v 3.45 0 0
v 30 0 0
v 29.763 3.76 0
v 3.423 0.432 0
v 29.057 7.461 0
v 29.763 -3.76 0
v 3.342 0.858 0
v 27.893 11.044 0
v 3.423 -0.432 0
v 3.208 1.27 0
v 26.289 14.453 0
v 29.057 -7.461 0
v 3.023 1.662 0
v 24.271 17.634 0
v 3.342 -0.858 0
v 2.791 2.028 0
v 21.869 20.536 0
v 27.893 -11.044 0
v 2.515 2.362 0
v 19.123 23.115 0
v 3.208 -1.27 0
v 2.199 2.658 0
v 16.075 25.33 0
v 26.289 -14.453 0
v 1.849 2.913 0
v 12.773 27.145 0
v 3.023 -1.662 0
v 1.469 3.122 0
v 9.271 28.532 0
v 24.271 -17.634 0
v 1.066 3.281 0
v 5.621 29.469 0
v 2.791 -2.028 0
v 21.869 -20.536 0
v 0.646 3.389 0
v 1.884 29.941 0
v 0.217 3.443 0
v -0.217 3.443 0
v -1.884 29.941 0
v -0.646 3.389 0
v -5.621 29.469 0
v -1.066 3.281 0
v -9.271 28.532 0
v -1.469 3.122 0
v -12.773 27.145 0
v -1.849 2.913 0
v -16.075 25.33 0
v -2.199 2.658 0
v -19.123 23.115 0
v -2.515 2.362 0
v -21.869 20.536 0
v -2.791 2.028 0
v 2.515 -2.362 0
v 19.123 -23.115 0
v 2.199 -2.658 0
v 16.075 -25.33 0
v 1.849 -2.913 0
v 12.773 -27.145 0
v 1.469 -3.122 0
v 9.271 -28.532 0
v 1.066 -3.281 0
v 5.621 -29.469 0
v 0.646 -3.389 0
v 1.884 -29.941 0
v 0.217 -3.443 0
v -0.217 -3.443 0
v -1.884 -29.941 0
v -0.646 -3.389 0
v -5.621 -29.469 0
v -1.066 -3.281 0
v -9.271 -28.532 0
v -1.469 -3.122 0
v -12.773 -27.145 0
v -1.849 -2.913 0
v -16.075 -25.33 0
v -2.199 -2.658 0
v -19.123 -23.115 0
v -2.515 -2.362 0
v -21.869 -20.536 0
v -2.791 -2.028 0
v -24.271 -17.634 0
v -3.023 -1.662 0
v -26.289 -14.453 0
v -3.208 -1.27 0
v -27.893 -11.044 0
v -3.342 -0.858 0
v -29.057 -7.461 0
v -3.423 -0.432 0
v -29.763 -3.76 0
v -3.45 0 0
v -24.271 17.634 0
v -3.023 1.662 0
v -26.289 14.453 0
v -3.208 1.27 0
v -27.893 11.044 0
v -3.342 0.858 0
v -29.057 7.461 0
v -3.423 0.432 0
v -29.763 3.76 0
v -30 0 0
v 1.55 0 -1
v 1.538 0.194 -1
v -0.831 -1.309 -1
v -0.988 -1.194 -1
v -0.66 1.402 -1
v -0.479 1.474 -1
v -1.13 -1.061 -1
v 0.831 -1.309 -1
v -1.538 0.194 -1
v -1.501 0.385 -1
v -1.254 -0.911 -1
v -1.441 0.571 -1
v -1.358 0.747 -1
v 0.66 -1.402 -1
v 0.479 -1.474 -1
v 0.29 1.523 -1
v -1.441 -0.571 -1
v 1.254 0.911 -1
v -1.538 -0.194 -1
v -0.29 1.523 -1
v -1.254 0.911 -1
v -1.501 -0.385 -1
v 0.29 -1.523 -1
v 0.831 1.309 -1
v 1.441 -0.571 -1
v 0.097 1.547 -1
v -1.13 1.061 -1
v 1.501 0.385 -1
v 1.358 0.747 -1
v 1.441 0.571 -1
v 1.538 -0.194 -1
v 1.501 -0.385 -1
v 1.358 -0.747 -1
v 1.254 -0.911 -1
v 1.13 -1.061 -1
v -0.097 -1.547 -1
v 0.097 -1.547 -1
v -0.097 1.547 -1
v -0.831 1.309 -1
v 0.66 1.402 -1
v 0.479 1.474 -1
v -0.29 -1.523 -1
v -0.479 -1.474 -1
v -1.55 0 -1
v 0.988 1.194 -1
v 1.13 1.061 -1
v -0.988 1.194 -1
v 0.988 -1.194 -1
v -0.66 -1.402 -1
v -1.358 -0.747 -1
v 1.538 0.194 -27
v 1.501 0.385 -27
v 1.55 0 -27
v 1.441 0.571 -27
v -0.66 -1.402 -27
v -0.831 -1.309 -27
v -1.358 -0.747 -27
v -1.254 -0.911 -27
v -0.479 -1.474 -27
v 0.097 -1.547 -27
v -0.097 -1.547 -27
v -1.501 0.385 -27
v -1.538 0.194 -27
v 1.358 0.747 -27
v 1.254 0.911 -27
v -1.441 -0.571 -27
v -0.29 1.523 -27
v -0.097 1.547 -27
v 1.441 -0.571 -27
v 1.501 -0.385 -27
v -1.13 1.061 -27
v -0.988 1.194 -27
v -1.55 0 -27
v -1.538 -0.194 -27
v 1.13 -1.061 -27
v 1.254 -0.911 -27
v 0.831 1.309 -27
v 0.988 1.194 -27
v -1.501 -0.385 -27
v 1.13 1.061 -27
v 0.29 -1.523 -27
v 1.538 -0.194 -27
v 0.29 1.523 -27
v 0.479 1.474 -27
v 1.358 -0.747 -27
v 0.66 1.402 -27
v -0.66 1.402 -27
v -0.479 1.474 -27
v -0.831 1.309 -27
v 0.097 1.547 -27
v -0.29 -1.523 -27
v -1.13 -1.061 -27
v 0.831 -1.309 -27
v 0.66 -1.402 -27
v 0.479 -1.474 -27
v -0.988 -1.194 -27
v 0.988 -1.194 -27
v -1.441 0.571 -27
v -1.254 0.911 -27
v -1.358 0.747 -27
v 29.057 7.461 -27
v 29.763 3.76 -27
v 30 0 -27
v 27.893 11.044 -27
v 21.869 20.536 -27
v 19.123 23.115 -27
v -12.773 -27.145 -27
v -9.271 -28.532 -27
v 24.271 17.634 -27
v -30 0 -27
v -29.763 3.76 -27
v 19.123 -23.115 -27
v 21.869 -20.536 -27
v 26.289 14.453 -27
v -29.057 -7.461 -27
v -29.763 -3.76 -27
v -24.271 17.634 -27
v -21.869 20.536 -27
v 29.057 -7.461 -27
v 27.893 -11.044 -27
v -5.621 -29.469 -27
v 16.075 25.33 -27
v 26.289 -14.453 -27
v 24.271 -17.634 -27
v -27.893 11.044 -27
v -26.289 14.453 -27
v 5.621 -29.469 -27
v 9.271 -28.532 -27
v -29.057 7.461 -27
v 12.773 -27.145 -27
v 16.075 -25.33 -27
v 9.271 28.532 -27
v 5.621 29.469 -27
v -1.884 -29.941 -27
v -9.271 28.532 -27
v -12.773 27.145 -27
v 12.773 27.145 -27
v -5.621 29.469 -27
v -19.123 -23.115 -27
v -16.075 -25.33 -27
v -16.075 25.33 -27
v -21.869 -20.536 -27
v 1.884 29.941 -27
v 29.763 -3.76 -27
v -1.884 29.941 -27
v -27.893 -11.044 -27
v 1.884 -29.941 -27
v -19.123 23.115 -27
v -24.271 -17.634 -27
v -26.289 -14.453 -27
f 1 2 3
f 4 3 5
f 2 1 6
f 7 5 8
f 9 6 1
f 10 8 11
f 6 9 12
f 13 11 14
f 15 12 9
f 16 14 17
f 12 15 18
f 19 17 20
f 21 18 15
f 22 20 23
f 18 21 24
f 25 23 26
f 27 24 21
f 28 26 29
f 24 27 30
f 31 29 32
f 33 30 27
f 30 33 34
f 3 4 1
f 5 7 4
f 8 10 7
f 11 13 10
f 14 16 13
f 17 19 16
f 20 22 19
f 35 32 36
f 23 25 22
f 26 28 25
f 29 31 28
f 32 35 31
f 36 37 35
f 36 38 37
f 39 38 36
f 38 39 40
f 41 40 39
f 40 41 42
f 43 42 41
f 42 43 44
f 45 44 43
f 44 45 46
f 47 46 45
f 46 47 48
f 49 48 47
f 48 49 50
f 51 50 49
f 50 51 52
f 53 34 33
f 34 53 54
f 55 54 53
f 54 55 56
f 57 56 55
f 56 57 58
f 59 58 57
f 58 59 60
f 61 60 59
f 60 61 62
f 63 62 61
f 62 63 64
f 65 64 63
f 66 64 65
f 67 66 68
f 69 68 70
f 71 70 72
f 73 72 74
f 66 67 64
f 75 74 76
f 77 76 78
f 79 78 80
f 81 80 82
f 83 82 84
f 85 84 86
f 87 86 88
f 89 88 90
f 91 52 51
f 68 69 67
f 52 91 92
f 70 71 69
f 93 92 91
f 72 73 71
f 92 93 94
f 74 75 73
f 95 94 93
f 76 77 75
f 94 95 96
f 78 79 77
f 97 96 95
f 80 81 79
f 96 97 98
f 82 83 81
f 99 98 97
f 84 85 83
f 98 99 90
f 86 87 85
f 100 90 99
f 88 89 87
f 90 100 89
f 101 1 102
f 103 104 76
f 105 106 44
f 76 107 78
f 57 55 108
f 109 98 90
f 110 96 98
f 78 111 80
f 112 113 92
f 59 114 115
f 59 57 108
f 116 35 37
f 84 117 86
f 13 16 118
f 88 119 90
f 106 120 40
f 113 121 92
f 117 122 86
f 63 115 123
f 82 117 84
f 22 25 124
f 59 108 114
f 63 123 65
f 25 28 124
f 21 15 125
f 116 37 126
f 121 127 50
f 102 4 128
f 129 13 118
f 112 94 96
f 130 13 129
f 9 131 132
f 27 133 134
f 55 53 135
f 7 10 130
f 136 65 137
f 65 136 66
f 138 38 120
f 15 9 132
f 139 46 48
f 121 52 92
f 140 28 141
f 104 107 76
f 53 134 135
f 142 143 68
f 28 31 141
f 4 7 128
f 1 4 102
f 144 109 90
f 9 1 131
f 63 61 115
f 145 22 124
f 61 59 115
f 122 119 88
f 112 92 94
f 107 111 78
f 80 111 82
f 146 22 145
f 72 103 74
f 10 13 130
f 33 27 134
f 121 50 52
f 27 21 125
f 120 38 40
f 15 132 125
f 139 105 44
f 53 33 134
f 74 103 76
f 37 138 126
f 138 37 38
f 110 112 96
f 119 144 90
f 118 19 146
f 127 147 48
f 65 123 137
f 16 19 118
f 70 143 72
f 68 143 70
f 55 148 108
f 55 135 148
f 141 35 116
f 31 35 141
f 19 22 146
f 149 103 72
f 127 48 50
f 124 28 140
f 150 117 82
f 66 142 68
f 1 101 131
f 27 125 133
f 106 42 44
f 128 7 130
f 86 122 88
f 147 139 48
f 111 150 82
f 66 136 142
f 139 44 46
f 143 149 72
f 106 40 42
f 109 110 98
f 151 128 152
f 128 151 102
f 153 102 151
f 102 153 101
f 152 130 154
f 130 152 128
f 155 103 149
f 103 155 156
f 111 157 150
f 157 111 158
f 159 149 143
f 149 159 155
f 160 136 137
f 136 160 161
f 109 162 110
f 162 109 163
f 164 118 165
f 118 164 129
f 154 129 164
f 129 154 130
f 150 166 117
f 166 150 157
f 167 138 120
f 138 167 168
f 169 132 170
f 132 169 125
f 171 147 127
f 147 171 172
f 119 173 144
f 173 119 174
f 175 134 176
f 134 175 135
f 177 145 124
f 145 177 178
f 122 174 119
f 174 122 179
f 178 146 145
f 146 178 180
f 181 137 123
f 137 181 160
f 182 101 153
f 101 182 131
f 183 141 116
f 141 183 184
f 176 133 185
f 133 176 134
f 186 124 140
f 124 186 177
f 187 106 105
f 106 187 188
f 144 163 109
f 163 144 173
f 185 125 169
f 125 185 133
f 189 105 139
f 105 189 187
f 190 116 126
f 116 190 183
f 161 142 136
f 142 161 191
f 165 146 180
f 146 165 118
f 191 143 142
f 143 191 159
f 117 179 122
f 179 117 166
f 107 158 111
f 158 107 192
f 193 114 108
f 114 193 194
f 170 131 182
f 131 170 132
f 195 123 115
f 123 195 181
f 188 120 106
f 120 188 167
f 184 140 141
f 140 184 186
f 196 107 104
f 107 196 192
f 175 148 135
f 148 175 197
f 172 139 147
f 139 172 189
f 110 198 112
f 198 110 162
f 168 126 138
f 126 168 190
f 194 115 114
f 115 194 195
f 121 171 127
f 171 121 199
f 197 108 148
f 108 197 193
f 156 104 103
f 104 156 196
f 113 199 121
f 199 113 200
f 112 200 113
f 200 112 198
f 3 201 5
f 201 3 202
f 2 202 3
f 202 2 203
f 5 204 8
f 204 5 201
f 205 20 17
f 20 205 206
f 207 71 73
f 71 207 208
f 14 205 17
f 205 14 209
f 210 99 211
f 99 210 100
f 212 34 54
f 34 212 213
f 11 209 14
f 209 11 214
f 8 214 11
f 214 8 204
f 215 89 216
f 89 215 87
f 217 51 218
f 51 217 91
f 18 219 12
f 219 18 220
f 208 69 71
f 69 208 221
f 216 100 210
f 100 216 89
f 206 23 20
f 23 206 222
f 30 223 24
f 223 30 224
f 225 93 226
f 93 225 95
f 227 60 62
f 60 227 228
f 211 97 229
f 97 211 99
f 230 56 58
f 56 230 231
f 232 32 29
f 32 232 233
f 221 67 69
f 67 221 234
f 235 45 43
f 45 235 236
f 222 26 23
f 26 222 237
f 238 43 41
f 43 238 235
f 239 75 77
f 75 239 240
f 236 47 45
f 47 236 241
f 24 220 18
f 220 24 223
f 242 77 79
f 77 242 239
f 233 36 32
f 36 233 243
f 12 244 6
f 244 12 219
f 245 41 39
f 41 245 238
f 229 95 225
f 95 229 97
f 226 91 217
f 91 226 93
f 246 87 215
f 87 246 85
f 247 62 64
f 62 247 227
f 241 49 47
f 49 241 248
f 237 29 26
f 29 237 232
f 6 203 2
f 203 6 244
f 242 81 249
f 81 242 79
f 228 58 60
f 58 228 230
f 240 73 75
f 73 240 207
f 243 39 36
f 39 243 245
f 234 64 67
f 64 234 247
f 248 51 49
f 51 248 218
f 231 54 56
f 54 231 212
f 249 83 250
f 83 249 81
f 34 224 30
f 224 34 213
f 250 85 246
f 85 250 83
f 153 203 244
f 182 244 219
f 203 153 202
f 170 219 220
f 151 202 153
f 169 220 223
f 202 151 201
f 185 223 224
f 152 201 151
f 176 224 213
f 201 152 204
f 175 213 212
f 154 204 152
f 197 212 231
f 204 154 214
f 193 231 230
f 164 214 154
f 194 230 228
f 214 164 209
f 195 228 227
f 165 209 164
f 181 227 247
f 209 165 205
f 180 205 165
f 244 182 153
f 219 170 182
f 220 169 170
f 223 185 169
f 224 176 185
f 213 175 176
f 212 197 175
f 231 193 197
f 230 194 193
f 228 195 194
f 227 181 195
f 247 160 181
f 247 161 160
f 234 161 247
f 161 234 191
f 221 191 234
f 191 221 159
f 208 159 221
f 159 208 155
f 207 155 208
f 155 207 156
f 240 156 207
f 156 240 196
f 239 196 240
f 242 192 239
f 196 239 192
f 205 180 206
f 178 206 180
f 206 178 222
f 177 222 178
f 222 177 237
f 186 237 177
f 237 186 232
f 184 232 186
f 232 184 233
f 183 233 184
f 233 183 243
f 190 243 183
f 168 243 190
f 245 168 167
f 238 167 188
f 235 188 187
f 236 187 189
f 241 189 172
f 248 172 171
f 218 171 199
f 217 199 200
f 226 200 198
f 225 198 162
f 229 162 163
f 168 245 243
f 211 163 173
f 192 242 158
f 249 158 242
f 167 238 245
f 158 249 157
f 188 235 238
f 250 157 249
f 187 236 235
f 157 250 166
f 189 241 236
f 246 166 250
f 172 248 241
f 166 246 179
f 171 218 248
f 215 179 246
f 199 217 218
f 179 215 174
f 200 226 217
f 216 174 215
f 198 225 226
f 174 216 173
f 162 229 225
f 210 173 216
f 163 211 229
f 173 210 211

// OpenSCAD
$fn = 50;

difference() {
	union() {
		translate(v = [0, 0, -27.0]) {
			cylinder(h = 27, r = 30.0);
		}
	}
	union() {
		translate(v = [0, 0, 0]) {
			rotate(a = [0, 0, 0]) {
				difference() {
					union() {
						translate(v = [0, 0, -30.0]) {
							cylinder(h = 30, r = 1.25);
						}
						translate(v = [0, 0, -1.0]) {
							cylinder(h = 1.0, r1 = 1.55, r2 = 3.45);
						}
						translate(v = [0, 0, -30.0]) {
							cylinder(h = 30, r = 1.55);
						}
						translate(v = [0, 0, -30.0]) {
							cylinder(h = 30, r = 1.25);
						}
					}
					union();
				}
			}
		}
	}
}
